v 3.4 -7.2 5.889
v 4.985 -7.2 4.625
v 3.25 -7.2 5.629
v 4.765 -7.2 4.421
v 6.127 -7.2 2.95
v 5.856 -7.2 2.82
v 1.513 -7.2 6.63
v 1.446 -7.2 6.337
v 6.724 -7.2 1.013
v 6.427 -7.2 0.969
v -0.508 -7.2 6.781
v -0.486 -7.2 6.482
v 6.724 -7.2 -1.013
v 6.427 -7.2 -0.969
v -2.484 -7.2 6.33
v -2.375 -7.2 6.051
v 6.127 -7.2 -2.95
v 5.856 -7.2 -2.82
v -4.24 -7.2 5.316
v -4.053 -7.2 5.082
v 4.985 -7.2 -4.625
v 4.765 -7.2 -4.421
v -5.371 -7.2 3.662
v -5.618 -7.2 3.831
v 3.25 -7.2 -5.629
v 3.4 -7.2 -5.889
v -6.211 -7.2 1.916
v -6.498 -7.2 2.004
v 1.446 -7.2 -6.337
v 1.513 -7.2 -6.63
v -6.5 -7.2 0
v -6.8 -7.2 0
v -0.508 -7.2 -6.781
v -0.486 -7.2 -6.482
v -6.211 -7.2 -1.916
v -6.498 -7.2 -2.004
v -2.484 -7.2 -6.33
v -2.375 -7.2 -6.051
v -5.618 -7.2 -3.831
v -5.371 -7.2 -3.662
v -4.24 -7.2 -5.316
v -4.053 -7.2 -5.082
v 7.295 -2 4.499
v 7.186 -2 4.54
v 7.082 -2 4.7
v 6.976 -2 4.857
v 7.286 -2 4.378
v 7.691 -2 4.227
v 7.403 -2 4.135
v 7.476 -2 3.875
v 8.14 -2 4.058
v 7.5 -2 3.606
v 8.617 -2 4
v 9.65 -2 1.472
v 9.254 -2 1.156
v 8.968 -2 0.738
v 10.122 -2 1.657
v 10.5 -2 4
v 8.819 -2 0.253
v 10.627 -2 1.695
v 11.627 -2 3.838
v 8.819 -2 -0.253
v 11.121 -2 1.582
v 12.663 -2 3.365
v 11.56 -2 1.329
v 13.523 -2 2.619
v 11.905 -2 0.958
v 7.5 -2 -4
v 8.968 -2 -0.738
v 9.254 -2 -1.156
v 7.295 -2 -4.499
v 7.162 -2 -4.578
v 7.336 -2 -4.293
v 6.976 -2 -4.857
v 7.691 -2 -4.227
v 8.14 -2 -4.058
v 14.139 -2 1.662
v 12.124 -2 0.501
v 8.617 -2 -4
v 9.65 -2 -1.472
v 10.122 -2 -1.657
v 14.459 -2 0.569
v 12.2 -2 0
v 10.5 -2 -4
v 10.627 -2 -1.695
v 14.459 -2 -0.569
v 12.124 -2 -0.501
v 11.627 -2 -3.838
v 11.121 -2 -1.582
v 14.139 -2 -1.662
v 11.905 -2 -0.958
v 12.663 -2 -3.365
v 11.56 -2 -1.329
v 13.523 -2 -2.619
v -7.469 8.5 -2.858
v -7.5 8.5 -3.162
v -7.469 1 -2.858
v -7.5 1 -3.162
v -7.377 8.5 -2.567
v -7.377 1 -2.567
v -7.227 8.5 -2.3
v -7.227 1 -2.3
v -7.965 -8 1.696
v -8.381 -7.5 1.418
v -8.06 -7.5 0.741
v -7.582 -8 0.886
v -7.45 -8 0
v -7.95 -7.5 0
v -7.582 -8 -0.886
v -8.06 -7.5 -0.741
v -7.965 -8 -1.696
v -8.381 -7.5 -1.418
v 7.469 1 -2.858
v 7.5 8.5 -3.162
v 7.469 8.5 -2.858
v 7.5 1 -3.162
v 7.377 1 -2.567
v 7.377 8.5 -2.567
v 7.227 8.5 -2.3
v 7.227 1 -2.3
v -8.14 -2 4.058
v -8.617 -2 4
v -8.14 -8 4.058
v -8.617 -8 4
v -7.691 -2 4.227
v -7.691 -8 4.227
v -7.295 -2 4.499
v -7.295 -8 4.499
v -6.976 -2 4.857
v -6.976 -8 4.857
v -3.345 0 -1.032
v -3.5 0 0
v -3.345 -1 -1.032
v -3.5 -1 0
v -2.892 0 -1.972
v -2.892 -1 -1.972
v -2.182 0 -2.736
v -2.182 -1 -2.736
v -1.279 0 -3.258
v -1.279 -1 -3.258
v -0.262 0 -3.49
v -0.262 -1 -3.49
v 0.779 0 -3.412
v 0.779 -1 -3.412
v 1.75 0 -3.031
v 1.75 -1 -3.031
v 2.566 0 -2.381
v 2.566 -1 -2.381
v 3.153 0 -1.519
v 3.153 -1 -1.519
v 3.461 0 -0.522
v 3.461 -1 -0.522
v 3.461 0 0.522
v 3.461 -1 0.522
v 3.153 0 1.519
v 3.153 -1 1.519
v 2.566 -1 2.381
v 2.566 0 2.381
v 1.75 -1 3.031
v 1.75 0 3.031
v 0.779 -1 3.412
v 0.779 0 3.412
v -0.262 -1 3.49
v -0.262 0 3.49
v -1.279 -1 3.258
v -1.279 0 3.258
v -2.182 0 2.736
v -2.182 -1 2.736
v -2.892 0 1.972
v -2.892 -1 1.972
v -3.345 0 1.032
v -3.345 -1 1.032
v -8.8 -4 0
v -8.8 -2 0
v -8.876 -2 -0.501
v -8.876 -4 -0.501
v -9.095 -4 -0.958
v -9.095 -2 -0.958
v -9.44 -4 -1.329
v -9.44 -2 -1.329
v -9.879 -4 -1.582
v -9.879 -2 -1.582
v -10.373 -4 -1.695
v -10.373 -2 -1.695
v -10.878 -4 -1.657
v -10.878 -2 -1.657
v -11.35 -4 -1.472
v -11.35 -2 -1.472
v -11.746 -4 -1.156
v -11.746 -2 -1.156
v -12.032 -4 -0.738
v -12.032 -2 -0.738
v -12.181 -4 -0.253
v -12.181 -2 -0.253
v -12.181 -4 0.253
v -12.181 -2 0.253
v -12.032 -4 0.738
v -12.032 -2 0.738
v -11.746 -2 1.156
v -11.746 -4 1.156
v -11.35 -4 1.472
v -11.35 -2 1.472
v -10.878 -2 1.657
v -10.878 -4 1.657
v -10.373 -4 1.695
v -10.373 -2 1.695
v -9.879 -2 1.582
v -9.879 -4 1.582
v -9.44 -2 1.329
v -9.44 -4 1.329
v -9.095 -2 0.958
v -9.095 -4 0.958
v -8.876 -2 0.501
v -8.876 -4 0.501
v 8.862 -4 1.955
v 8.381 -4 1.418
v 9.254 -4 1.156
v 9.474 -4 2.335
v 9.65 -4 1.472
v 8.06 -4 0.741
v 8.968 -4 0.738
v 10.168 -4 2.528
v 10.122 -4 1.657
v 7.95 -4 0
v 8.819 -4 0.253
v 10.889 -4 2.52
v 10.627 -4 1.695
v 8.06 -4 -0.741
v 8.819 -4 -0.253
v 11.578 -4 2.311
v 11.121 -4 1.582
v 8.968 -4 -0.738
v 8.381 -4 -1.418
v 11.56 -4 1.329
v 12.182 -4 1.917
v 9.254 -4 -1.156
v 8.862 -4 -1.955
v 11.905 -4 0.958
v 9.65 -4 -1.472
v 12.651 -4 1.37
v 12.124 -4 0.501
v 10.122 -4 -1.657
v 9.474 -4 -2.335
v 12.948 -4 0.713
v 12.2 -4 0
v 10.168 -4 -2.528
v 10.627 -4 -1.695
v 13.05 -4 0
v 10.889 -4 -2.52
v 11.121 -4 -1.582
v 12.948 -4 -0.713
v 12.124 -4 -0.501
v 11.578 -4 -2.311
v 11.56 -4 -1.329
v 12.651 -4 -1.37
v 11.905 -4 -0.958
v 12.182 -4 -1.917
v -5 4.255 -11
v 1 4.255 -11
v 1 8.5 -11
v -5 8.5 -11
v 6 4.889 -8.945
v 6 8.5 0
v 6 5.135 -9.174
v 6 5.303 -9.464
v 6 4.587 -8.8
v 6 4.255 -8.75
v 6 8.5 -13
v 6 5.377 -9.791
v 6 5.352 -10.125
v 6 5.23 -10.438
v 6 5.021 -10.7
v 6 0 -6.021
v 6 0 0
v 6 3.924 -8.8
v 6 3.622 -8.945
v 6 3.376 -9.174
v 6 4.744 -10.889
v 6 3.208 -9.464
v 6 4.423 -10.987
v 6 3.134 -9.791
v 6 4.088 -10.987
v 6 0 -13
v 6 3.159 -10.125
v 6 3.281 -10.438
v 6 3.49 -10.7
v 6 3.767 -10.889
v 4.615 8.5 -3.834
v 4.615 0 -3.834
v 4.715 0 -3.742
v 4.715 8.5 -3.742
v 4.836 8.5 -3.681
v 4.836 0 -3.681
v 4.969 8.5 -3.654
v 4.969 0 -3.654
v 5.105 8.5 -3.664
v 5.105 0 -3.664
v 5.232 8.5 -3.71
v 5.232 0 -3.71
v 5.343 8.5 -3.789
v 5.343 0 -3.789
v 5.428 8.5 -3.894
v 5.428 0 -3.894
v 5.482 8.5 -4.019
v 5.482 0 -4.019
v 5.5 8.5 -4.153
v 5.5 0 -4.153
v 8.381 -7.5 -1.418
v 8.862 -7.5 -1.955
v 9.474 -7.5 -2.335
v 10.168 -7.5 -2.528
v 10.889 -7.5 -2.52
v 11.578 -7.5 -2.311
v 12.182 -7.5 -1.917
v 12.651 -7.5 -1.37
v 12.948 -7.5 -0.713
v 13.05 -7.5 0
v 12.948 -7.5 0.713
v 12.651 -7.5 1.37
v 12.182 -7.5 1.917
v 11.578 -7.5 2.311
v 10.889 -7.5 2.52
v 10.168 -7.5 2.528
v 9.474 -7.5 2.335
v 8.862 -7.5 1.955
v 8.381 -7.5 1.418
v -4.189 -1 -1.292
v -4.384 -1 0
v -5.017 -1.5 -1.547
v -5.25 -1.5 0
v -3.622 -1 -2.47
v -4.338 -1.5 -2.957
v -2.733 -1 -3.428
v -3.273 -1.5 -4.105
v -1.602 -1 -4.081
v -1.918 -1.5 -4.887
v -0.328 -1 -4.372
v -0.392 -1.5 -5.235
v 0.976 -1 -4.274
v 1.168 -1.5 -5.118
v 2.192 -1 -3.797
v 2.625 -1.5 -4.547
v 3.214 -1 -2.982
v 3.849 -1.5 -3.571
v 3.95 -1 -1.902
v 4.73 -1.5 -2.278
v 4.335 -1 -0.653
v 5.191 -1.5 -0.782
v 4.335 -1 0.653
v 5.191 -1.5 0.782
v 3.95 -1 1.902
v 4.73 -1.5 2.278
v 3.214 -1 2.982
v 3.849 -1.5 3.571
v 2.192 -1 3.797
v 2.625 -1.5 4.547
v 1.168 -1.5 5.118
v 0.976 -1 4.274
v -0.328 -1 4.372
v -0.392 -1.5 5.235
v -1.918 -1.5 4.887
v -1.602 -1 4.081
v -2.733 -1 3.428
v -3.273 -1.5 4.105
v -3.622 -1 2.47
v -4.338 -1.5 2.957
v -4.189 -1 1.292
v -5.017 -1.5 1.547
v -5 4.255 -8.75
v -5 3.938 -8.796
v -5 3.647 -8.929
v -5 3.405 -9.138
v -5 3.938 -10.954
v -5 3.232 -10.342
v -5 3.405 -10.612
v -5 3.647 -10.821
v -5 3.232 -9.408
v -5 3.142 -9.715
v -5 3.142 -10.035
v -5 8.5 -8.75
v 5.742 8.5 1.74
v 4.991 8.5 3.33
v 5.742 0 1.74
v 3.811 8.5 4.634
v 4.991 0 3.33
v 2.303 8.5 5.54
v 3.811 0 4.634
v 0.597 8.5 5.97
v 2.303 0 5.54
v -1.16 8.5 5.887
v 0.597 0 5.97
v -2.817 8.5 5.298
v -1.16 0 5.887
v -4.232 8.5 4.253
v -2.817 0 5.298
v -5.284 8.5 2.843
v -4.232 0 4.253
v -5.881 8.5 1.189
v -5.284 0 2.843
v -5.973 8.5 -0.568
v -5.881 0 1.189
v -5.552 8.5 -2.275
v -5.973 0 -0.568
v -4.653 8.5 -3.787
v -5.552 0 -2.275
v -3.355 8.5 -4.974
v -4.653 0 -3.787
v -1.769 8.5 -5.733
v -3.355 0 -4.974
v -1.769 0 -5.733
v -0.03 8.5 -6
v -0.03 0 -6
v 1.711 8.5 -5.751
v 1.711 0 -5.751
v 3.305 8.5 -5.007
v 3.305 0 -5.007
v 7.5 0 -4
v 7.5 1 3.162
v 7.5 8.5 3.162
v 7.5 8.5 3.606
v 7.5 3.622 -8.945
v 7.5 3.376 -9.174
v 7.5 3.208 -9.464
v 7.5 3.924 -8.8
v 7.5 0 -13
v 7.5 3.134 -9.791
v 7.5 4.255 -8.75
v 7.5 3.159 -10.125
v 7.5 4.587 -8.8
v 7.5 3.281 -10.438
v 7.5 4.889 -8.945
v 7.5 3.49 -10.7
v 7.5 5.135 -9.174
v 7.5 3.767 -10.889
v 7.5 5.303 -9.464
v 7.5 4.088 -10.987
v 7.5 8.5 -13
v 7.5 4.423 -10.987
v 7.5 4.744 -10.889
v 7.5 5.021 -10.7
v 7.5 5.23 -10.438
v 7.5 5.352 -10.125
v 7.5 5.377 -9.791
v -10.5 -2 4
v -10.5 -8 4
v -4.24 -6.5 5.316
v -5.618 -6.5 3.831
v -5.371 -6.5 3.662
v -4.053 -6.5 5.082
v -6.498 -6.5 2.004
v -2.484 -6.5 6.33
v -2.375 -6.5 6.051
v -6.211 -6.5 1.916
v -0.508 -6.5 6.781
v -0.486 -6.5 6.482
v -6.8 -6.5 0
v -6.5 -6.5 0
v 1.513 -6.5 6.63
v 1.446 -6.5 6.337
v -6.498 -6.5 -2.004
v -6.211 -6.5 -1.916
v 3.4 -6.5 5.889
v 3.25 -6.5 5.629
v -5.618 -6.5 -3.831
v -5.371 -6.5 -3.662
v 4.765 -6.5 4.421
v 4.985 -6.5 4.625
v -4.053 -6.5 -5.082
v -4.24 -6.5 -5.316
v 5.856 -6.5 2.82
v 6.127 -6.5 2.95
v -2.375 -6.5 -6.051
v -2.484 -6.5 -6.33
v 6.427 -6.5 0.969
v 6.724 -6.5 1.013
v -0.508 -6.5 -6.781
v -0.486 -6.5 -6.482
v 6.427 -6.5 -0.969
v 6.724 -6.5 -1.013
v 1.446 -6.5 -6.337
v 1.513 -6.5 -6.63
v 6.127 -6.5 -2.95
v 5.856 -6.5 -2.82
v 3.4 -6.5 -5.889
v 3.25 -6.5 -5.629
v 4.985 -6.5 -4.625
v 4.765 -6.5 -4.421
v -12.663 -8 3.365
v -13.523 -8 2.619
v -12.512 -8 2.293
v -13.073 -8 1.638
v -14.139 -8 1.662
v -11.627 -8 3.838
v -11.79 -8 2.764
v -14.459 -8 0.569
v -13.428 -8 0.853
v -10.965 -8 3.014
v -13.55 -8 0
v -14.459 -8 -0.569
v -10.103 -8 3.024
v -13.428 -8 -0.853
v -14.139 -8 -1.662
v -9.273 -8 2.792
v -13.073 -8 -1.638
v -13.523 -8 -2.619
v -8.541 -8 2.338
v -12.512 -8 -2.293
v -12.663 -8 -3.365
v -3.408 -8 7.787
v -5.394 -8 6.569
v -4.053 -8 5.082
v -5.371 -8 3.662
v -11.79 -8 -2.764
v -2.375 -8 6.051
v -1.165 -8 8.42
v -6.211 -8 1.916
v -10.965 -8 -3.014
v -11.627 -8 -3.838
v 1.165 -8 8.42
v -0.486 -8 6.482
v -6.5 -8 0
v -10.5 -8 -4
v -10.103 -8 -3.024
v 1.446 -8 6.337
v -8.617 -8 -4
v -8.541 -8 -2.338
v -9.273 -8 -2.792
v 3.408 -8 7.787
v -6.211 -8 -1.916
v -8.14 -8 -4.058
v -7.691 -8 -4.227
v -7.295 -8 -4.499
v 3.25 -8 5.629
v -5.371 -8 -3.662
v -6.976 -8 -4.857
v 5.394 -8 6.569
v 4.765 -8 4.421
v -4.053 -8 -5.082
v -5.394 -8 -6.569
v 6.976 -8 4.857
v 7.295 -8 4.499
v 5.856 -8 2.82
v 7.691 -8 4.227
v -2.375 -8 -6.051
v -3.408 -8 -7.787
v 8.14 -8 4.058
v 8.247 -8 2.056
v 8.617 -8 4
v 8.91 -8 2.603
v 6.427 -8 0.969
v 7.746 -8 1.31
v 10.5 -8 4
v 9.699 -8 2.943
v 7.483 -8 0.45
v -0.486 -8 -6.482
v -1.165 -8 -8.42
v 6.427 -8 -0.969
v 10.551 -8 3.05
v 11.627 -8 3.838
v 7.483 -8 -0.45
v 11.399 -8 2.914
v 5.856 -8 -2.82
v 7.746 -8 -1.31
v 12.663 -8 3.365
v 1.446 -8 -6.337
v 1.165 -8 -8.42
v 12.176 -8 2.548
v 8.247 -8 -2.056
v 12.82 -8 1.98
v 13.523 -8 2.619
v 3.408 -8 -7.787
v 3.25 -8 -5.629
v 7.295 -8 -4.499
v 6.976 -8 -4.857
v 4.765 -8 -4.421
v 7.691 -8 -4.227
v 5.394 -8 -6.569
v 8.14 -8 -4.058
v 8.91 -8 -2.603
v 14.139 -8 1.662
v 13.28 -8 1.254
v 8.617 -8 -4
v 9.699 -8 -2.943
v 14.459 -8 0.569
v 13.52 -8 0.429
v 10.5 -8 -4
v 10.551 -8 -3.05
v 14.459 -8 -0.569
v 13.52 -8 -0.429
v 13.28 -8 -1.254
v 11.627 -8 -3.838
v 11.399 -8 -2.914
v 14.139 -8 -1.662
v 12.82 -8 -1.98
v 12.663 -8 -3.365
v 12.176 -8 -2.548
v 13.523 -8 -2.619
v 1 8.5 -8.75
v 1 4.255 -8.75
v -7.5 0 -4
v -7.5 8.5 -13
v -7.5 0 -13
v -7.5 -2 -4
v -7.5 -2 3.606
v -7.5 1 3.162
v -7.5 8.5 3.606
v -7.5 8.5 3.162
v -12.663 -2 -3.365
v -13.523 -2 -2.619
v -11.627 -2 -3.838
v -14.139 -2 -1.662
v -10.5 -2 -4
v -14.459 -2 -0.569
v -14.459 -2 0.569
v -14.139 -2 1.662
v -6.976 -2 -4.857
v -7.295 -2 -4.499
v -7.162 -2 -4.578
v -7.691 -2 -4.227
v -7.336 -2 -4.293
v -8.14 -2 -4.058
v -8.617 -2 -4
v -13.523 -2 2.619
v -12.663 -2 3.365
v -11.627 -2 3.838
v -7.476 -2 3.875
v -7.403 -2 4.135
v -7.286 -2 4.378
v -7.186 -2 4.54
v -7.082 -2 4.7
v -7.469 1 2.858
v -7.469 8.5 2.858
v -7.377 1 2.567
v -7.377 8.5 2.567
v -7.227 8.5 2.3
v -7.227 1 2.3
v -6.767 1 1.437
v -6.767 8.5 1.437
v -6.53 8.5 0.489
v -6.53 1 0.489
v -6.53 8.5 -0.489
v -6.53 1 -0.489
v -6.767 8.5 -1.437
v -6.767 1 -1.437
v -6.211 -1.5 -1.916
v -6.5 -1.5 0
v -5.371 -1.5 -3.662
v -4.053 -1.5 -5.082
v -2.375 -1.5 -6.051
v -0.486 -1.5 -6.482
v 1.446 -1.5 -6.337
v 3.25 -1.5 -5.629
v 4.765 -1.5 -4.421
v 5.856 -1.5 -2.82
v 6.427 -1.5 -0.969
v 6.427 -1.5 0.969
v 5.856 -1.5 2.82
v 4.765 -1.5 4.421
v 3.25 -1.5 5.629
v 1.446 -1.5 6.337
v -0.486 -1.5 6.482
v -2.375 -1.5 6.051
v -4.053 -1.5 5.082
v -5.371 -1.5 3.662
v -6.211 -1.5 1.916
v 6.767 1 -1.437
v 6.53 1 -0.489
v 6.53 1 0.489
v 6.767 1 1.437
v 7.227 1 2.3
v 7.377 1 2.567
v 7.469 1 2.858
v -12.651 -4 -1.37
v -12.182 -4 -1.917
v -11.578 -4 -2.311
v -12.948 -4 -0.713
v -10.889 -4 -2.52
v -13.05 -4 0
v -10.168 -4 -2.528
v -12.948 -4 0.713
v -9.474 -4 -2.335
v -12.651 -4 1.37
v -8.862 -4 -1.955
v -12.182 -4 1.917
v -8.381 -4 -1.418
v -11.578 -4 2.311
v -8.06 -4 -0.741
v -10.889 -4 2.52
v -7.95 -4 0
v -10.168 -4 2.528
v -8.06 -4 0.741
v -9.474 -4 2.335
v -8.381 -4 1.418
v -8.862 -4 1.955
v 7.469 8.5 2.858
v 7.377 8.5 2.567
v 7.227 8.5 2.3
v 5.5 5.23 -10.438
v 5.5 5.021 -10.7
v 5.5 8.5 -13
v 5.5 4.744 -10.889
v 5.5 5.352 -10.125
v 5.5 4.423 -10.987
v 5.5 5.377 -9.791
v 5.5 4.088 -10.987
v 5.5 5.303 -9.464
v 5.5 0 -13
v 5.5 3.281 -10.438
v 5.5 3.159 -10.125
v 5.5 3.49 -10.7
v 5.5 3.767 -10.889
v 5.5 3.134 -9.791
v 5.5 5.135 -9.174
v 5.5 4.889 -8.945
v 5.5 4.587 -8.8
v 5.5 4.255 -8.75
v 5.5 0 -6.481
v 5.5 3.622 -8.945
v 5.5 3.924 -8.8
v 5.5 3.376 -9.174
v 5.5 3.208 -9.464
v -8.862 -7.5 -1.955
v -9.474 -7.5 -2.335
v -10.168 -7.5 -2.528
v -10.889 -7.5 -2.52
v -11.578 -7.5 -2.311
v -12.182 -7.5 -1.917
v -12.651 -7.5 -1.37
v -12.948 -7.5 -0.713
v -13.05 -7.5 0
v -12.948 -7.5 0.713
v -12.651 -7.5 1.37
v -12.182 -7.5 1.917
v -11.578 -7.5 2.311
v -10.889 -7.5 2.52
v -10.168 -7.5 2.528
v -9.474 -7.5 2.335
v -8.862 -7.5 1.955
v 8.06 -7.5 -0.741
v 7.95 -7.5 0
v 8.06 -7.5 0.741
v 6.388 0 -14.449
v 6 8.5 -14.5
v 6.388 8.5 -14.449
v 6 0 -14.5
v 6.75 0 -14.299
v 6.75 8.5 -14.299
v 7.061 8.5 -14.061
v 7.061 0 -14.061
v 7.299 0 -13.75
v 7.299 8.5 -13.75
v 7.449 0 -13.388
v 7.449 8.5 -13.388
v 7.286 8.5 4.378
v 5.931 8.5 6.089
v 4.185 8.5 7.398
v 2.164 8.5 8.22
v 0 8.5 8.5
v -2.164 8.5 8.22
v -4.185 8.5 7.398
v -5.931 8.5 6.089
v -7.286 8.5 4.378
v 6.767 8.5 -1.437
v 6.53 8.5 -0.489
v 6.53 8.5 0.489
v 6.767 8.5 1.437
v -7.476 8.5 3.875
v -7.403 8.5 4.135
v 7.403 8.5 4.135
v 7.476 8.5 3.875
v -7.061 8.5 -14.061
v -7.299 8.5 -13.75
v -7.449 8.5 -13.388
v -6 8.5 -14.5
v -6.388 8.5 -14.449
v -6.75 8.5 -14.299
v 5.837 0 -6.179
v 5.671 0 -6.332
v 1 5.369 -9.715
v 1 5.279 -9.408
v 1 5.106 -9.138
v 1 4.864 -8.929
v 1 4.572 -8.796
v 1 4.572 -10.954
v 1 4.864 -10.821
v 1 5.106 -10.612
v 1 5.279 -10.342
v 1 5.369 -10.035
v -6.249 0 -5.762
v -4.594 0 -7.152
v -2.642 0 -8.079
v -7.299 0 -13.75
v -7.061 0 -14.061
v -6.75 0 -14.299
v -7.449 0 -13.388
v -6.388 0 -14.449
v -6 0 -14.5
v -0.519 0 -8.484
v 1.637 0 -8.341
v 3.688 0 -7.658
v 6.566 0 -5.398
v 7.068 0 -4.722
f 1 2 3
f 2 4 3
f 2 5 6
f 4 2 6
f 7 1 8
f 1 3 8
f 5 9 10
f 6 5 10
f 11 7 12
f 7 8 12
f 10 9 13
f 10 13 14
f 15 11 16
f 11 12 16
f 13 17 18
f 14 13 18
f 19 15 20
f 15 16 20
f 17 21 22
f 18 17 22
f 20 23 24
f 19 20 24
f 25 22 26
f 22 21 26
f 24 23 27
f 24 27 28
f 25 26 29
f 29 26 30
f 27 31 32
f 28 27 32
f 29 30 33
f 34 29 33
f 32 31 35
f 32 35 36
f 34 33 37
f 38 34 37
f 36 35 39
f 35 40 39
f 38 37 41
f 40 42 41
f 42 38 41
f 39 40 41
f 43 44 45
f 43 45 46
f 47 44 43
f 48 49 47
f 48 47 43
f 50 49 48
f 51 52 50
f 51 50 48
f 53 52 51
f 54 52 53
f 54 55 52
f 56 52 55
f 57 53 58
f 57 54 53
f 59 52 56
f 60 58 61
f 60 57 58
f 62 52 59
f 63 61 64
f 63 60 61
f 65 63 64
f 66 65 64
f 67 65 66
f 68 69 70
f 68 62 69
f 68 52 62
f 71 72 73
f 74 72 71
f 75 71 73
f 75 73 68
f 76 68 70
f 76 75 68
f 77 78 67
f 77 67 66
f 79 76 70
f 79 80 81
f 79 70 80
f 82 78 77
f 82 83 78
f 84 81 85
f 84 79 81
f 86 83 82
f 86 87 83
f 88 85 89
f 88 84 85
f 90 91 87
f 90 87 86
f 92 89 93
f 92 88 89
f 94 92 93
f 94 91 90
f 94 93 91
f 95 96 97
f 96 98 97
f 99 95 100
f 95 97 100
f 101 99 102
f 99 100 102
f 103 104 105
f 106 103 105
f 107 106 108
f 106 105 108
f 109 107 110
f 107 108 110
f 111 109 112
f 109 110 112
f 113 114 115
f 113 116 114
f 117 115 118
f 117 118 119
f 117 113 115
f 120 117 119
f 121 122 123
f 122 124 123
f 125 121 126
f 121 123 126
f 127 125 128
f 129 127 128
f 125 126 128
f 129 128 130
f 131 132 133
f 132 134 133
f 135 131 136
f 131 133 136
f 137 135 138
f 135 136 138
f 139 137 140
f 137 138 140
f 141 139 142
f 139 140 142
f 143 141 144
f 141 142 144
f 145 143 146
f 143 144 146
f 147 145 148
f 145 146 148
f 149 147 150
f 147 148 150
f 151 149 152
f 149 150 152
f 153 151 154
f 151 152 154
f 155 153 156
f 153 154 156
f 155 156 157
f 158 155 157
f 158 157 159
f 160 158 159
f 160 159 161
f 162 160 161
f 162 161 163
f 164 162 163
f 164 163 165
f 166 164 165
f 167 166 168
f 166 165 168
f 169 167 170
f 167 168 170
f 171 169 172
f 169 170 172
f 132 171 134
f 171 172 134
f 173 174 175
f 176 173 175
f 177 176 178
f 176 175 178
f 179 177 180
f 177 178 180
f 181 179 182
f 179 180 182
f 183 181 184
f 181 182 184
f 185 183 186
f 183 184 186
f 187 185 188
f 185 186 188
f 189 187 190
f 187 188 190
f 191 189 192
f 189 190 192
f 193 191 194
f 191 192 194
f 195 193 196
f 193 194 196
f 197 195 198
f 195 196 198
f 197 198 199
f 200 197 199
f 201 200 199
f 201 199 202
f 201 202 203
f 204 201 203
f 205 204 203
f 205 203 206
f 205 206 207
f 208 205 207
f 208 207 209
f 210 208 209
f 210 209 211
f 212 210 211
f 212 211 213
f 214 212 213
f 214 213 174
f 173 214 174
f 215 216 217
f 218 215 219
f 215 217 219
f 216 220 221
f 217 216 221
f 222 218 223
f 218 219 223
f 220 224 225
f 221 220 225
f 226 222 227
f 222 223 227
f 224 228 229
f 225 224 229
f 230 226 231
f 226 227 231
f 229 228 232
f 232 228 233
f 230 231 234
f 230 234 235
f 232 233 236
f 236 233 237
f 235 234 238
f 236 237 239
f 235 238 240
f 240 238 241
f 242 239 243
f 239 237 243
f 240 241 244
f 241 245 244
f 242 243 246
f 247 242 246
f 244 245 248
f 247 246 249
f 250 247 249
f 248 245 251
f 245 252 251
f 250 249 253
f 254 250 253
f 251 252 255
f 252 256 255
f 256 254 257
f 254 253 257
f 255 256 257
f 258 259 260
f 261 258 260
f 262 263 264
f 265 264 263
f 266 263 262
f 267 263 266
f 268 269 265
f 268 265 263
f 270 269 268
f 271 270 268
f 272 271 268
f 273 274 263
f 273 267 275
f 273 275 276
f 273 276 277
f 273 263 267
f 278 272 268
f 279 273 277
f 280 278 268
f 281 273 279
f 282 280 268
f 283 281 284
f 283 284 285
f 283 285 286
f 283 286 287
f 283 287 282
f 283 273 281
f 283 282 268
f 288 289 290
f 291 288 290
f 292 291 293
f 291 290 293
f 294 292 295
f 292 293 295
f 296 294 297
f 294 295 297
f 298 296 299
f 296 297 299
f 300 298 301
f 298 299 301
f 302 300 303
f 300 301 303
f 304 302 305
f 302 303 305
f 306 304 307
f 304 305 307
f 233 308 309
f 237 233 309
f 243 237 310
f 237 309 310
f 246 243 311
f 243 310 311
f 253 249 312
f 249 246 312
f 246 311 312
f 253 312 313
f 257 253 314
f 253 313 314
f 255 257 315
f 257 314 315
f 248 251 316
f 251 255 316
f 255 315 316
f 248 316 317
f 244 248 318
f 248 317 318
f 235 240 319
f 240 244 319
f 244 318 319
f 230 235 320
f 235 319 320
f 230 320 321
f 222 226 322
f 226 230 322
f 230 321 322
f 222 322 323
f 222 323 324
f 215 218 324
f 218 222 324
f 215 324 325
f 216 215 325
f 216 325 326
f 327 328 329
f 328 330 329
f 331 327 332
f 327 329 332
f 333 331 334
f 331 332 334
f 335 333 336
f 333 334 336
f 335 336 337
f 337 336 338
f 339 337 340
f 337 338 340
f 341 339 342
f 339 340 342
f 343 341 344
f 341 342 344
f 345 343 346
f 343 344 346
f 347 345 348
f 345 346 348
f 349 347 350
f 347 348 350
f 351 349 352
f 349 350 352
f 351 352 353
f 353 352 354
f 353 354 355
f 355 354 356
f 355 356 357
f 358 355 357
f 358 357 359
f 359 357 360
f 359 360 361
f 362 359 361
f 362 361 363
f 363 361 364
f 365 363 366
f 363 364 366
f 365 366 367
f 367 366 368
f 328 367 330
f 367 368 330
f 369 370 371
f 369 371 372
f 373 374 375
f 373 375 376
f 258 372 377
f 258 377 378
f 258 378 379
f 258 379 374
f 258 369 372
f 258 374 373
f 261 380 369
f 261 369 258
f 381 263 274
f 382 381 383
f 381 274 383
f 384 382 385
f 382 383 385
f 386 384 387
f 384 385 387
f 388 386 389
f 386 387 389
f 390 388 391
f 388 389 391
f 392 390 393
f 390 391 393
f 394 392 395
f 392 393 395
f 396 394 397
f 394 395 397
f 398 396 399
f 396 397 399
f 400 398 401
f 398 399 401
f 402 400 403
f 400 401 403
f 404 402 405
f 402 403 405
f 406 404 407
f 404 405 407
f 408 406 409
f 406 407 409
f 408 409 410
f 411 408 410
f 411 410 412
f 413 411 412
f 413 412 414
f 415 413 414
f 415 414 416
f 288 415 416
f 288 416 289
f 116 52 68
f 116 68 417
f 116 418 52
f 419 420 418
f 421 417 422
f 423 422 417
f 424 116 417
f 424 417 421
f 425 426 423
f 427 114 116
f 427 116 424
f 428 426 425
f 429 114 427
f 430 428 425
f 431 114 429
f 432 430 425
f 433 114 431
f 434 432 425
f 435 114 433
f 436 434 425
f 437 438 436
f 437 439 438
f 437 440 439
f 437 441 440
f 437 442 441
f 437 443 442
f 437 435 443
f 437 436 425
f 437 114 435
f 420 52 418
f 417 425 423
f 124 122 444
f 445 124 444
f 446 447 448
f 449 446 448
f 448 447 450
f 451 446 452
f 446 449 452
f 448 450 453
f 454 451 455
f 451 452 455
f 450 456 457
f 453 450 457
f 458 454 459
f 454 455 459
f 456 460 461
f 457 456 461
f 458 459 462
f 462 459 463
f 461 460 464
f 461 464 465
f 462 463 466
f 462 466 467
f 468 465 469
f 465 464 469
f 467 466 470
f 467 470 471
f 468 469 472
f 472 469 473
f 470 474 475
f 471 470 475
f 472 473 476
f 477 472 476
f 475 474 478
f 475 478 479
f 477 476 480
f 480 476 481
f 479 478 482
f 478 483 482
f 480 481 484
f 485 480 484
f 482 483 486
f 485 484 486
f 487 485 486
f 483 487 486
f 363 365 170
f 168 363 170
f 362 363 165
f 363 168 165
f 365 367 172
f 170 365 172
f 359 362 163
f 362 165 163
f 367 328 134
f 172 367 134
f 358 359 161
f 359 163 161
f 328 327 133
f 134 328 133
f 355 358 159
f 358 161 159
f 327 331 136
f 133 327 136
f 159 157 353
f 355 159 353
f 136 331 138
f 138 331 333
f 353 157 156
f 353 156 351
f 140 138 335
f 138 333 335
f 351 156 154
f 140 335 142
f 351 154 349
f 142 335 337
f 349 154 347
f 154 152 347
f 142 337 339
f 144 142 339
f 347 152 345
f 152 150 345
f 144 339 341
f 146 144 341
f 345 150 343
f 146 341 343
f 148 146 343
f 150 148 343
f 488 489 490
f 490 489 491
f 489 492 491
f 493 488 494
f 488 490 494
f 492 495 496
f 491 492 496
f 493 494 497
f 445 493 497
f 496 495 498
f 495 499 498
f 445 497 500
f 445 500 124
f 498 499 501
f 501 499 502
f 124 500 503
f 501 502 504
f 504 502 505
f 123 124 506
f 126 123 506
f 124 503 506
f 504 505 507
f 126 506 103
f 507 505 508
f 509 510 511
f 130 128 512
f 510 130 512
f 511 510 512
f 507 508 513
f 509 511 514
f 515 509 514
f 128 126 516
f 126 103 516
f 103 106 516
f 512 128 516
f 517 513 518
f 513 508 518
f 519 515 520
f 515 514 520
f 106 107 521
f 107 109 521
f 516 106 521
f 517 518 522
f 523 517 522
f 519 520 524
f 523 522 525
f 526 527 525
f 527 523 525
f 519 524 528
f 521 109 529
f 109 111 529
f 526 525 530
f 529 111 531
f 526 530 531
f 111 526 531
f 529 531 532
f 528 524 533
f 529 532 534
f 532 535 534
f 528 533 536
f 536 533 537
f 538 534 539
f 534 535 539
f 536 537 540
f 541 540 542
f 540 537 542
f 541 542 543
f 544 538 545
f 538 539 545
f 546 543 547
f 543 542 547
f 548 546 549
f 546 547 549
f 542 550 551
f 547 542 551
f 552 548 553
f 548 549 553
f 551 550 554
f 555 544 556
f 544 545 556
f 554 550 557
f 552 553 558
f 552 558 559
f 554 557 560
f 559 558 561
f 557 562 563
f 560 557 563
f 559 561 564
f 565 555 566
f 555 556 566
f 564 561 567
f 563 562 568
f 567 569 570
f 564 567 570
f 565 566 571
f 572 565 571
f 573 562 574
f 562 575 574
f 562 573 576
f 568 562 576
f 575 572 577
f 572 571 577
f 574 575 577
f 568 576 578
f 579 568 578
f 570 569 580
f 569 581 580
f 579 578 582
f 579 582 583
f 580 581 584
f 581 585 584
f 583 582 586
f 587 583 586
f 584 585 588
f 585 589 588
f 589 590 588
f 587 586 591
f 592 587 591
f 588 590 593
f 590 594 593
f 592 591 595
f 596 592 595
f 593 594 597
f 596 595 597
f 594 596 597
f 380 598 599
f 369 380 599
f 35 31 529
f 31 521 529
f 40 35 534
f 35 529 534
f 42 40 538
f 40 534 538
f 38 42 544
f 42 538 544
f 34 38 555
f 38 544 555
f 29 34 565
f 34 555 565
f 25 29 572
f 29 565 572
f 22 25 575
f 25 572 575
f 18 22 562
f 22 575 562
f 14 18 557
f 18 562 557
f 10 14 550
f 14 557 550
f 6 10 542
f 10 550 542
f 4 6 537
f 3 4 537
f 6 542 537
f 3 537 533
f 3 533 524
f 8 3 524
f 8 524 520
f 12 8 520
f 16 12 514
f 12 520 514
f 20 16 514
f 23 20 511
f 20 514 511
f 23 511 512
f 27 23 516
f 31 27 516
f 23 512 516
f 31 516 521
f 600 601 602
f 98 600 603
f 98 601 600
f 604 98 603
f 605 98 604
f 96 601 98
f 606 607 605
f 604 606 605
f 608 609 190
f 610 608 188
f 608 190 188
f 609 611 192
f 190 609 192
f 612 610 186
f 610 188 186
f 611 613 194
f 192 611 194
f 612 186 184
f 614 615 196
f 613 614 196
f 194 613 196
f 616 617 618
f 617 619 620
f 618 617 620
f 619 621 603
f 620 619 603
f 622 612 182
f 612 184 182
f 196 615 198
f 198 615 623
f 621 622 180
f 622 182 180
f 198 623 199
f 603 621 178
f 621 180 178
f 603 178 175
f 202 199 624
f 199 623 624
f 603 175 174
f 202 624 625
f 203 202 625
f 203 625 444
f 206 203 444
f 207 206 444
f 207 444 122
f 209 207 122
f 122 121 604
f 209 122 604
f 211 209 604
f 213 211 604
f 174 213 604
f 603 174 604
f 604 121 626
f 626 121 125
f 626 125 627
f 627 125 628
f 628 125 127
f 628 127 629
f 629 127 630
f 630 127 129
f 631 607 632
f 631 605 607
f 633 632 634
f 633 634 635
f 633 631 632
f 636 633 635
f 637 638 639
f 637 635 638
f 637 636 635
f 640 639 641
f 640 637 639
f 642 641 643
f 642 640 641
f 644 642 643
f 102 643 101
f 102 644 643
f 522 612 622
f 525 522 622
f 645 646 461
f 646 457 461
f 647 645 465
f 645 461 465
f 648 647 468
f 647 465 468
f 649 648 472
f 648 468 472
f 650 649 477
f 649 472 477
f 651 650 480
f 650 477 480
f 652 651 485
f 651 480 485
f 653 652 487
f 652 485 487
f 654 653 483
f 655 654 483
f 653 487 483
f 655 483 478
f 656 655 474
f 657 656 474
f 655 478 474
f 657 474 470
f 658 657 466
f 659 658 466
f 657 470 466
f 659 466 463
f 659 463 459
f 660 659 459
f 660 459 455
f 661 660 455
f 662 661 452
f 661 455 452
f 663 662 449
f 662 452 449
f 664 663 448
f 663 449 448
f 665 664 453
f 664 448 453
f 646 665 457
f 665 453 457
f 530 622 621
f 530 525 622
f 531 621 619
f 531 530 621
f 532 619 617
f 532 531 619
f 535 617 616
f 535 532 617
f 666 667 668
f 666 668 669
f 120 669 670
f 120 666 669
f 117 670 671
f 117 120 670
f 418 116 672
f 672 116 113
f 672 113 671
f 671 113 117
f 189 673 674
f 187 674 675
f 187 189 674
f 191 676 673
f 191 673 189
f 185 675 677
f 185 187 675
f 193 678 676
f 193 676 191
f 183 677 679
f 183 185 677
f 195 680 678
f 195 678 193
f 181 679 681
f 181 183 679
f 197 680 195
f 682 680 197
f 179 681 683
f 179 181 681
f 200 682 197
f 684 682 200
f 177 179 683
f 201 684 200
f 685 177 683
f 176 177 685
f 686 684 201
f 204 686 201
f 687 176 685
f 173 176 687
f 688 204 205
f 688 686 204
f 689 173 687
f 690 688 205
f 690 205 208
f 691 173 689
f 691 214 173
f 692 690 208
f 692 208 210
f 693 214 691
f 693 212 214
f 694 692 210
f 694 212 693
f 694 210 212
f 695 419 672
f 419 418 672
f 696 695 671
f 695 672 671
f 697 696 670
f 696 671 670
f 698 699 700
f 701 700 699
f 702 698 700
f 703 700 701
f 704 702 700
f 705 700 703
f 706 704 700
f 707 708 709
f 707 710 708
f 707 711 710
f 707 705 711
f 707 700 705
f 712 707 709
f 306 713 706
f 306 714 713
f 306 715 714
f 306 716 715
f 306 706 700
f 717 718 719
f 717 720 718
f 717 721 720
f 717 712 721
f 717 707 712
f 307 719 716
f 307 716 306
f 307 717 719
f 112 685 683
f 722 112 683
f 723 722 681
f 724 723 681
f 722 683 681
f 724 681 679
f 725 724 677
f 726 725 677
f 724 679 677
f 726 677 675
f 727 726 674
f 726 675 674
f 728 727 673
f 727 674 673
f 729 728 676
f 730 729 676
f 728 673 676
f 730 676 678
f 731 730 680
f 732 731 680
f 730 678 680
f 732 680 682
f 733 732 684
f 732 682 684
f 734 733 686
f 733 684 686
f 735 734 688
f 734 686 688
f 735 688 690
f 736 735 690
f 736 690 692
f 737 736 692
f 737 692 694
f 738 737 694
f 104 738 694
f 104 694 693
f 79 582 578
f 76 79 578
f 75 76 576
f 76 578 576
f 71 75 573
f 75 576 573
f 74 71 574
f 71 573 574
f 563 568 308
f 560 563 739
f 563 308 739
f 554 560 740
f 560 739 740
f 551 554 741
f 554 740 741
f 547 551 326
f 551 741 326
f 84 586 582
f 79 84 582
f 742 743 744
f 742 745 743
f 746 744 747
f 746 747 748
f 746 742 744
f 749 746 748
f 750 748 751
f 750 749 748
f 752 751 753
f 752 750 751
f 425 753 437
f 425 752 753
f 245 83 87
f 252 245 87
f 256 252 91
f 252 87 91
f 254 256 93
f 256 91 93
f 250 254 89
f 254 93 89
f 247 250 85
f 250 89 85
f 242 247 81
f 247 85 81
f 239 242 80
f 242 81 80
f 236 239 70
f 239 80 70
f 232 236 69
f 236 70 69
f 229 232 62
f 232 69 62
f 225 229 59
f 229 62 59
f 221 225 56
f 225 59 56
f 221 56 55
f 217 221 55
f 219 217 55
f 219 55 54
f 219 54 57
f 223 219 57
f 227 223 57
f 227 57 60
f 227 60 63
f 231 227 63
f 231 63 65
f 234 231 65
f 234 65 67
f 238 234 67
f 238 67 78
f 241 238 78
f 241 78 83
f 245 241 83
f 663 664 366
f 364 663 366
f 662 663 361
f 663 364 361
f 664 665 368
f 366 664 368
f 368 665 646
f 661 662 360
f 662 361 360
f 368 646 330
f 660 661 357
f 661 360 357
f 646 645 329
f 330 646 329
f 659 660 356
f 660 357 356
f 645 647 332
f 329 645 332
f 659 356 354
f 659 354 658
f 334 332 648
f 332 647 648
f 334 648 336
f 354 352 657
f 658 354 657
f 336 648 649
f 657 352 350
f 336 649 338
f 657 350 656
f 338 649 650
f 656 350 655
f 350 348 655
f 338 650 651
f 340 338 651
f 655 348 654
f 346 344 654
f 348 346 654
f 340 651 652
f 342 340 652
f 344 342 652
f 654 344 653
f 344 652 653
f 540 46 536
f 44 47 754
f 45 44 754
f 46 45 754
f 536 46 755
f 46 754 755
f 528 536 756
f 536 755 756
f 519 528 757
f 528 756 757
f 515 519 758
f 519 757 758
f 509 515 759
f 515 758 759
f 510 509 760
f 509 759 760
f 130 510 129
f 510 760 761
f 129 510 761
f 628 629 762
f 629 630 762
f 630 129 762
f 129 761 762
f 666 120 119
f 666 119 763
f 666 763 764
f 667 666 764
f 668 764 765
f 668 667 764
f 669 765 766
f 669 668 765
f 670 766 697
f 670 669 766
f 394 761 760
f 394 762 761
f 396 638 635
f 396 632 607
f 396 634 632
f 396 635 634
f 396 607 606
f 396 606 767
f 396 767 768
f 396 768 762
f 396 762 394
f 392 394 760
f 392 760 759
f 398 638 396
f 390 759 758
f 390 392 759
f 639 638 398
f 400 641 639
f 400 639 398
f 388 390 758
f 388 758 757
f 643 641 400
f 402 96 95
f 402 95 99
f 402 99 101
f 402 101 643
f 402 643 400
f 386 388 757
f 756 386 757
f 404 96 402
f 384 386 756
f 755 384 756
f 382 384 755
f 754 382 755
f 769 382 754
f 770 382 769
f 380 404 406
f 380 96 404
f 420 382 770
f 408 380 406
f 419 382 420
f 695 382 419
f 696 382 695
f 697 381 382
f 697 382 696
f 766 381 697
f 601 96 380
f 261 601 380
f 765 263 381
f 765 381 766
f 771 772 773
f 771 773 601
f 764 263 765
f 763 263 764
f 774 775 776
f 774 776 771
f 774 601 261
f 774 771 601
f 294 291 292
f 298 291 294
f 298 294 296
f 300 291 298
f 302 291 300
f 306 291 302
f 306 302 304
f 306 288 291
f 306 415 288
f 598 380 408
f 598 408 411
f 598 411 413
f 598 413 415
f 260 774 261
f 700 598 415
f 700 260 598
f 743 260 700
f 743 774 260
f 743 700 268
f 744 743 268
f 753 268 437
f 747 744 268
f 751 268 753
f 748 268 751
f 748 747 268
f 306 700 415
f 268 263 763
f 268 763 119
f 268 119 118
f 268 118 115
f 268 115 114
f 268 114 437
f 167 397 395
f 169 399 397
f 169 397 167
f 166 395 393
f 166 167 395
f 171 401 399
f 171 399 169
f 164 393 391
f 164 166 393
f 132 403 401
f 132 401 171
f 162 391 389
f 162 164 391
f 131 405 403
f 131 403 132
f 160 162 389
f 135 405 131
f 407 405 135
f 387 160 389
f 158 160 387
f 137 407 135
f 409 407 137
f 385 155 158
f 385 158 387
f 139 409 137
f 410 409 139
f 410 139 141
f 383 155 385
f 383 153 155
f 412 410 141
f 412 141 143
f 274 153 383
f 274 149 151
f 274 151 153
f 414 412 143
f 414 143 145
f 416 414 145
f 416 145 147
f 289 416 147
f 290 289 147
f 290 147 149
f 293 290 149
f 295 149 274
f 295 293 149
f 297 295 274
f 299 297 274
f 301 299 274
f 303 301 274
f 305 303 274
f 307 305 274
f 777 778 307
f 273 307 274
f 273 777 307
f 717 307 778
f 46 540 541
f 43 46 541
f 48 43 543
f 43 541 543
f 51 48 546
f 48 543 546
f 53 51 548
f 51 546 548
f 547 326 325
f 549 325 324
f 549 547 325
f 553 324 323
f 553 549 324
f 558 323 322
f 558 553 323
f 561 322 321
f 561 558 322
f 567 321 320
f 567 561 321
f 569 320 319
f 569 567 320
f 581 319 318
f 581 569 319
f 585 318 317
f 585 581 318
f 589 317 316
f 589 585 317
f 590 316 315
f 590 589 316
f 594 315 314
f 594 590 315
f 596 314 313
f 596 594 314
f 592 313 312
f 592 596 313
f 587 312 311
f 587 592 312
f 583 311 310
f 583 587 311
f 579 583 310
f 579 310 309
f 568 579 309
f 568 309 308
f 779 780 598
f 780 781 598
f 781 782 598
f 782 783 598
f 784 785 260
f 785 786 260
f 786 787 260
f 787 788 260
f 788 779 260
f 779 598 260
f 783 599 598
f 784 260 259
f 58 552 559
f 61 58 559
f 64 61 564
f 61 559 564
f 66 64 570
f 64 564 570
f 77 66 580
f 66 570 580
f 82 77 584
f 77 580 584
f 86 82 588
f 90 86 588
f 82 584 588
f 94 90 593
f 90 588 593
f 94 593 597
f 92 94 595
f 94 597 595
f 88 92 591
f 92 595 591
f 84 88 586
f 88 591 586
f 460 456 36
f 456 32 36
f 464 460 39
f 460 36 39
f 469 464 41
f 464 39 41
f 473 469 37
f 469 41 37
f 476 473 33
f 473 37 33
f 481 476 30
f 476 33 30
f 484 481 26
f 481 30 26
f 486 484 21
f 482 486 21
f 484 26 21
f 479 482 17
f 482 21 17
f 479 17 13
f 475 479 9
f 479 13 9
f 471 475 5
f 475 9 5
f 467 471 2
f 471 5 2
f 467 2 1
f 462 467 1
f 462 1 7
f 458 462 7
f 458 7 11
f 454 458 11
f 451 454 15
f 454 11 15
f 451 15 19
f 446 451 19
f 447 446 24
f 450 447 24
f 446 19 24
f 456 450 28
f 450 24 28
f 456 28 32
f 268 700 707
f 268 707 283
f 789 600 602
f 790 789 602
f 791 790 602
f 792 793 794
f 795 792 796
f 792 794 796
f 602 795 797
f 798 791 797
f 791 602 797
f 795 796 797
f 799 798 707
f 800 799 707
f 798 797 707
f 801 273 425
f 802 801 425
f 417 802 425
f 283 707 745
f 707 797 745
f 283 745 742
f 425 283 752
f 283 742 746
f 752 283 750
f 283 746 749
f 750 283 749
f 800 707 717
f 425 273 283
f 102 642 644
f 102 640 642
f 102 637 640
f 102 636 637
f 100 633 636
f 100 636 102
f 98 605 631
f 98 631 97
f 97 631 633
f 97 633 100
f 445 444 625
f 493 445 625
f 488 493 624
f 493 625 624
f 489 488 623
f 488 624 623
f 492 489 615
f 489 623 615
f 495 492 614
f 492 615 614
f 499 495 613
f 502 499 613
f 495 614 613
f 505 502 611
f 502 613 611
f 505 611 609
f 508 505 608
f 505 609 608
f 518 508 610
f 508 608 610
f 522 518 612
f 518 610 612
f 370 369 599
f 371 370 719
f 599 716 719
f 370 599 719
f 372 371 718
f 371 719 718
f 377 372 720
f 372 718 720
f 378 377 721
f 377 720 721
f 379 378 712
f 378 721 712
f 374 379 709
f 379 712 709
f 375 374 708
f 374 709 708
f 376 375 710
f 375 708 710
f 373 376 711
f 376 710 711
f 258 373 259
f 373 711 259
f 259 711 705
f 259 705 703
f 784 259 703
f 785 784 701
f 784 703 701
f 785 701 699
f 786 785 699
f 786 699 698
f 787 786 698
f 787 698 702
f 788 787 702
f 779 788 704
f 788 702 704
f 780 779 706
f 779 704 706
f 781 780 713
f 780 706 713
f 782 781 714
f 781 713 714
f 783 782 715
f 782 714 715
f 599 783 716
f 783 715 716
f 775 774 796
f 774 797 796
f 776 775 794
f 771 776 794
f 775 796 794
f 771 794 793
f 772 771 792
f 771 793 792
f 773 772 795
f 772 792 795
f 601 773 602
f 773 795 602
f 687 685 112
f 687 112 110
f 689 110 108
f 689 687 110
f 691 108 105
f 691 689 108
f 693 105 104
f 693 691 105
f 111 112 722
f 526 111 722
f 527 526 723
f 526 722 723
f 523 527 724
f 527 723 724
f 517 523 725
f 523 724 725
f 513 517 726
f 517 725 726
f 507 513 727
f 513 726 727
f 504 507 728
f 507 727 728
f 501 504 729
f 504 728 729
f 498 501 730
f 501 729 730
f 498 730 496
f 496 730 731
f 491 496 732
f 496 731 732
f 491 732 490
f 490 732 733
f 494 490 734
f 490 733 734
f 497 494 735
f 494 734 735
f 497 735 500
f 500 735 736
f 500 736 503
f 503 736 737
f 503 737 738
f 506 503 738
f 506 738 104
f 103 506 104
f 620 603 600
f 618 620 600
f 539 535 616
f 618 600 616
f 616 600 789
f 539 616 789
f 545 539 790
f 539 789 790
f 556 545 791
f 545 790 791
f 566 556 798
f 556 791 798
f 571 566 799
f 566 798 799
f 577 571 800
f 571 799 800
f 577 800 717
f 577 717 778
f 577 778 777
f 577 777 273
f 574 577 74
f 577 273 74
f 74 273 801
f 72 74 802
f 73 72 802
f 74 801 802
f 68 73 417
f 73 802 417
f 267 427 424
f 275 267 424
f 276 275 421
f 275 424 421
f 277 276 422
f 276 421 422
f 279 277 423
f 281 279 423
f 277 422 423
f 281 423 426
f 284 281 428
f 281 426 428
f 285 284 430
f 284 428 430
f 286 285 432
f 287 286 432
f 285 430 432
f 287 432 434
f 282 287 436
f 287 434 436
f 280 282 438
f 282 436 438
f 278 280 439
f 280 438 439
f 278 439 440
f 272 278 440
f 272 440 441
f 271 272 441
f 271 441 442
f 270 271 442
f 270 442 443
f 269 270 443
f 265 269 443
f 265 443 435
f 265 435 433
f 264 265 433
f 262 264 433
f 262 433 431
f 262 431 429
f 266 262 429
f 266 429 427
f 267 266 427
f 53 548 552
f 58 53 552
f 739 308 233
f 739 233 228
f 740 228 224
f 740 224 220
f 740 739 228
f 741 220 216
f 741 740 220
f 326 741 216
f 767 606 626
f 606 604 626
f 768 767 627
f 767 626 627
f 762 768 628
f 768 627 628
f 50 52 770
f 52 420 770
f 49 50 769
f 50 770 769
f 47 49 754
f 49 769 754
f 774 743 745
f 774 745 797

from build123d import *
from build123d.topology import SkipClean

# Parameters (mm, degrees)
BOSS_EXTRU_1_START      = -6
BOSS_EXTRU_1_DEPTH      = 6
BOSS_EXTRU_2_START      = -6
BOSS_EXTRU_2_DEPTH      = 2
ENL_V_START             = -4
ESQUISSE3_5_R           = 2.55
ENL_V_MAT_EXTRU_1_DEPTH = 4
ENL_V_START_2           = -16.5
ENL_V_MAT_EXTRU_5_DEPTH = 10.5
CONG_1_R                = 2
CHANFREIN1_SIZE         = 0.5
SYM_TRIE1_START         = -2
SYM_TRIE1_DEPTH         = 10.5
SYM_TRIE1_START_2       = -8
SYM_TRIE1_2_DEPTH       = 4
SYM_TRIE1_START_3       = -7.5000001
SYM_TRIE1_3_DEPTH       = 5.5000001
SYM_TRIE1_START_4       = -4
SYM_TRIE1_4_DEPTH       = 2
SYM_TRIE1_7_DEPTH       = 0.4999999
M3_CLEARANCE_HOLE1_D    = 3.4
BOSS_EXTRU_3_DEPTH      = 8.5
ENL_V_START_3           = -8.5
ENL_V_MAT_EXTRU_2_DEPTH = 8.5
ENL_V_START_4           = -6.5
ESQUISSE5_R             = 1.125
ENL_V_MAT_EXTRU_3_DEPTH = 6
ESQUISSE5_3_R           = 1.125
ENL_V_MAT_EXTRU_4_DEPTH = 6.5
CONG_2_R                = 0.5
CONG_3_R                = 1.5
ENL_V_START_5           = -7.5
ESQUISSE9_R             = 4
ENL_V_MAT_EXTRU_8_DEPTH = 7.5
CONG_5_R                = 1.5


with BuildPart() as part:
    # Esquisse1 → Révolution1 (revolve)
    with BuildSketch(Plane.XY):
        Polygon((-8.5, 8.5), (-6, 8.5), (-6, 0), (-3.5, 0), (-3.5, -1), (-4.383974596, -1), (-5.25, -1.5), (-6.5, -1.5), (-6.5, -6.5), (-6.8, -6.5), (-6.8, -7.2), (-6.5, -7.2), (-6.5, -8), (-8.5, -8), align=None)
    revolve(axis=Axis((0, 6.43509573, 0), (0, -1, 0)))

    # Esquisse3 → Boss.-Extru.1 (add)
    with BuildSketch(Plane.XZ.offset(8).offset(BOSS_EXTRU_1_START)):
        with BuildLine():
            ThreePointArc((-7.928571429, 3.06394437), (-7.728470361, 3.5384666), (-7.5, 4))
            Line((-7.5, 4), (-10.5, 4))
            ThreePointArc((-10.5, 4), (-14.5, 0), (-10.5, -4))
            Line((-10.5, -4), (-7.5, -4))
            ThreePointArc((-7.5, -4), (-7.728470361, -3.5384666), (-7.928571429, -3.06394437))
            ThreePointArc((-7.928571429, -3.06394437), (-8.196108254, -2.252511816), (-8.380833333, -1.418320358))
            ThreePointArc((-8.380833333, -1.418320358), (-13.05, 0), (-8.380833333, 1.418320358))
            ThreePointArc((-8.380833333, 1.418320358), (-8.196108254, 2.252511816), (-7.928571429, 3.06394437))
        make_face()
    extrude(amount=BOSS_EXTRU_1_DEPTH)

    # Esquisse3<4> → Boss.-Extru.2 (add)
    with BuildSketch(Plane.XZ.offset(8).offset(BOSS_EXTRU_2_START)):
        with BuildLine():
            ThreePointArc((-8.380833333, -1.418320358), (-8.5, 0), (-8.380833333, 1.418320358))
            ThreePointArc((-8.380833333, 1.418320358), (-13.05, 0), (-8.380833333, -1.418320358))
        make_face()
    extrude(amount=BOSS_EXTRU_2_DEPTH)

    # Esquisse3<5> → Enlèv. mat.-Extru.1 (cut)
    with BuildSketch(Plane.XZ.offset(8).offset(ENL_V_START)):
        with Locations((-10.5, 0)):
            Circle(ESQUISSE3_5_R)
    extrude(amount=ENL_V_MAT_EXTRU_1_DEPTH, mode=Mode.SUBTRACT)

    # Esquisse3<7> → Enlèv. mat.-Extru.5 (cut)
    with BuildSketch(Plane.XZ.offset(8).offset(ENL_V_START_2)):
        with BuildLine():
            ThreePointArc((-7.5, 4), (-8.5, 0), (-7.5, -4))
            Line((-7.5, -4), (-7.5, 4))
        make_face()
    extrude(amount=ENL_V_MAT_EXTRU_5_DEPTH, mode=Mode.SUBTRACT)

    # Congé1
    cong_1_edges = [part.edges().sort_by_distance(p)[0] for p in [
        (-7.5, -5, 4),
        (-7.5, -5, -4),
    ]]
    fillet(cong_1_edges, radius=CONG_1_R)

    # Chanfrein1
    chanfrein1_edges = [part.edges().sort_by_distance(p)[0] for p in [
        (-8.06008453, -8, 0.741156191),
    ]]
    chamfer(chanfrein1_edges, length=CHANFREIN1_SIZE)

    # Symétrie1: read off the stored shape, not the designer's step
    # Symétrie1 outline → Symétrie1 (cut)
    with BuildSketch(Plane(origin=(0, 0, 0), x_dir=(1, 0, 0), z_dir=(0, 1, 0)).offset(SYM_TRIE1_START)):
        with BuildLine():
            Line((7.5, 4), (7.5, -4))
            ThreePointArc((7.5, -4), (8.5, 0), (7.5, 4))
        make_face()
    extrude(amount=SYM_TRIE1_DEPTH, mode=Mode.SUBTRACT)

    # Sym_trie1 2 outline → Sym_trie1 2 (cut)
    with BuildSketch(Plane(origin=(0, 0, 0), x_dir=(1, 0, 0), z_dir=(0, 1, 0)).offset(SYM_TRIE1_START_2)):
        with BuildLine():
            ThreePointArc((8.380833333, 1.418320358), (7.95, 0), (8.380833333, -1.418320358))
            ThreePointArc((8.380833333, -1.418320358), (8.5, 0), (8.380833333, 1.418320358))
        make_face()
    extrude(amount=SYM_TRIE1_2_DEPTH, mode=Mode.SUBTRACT)

    # Sym_trie1 3 outline → Sym_trie1 3 (add)
    with BuildSketch(Plane(origin=(0, 0, 0), x_dir=(1, 0, 0), z_dir=(0, 1, 0)).offset(SYM_TRIE1_START_3)):
        with BuildLine():
            ThreePointArc((6.975540357, -4.857142857), (7.69102387, -4.227189479), (8.61684397, -4))
            Line((8.61684397, -4), (10.5, -4))
            ThreePointArc((10.5, -4), (14.5, 0), (10.5, 4))
            Line((10.5, 4), (8.61684397, 4))
            ThreePointArc((8.61684397, 4), (7.69102387, 4.227189479), (6.975540357, 4.857142857))
            ThreePointArc((6.975540357, 4.857142857), (7.868349781, 3.215442696), (8.380833333, 1.418320358))
            ThreePointArc((8.380833333, 1.418320358), (13.05, 0), (8.380833333, -1.418320358))
            ThreePointArc((8.380833333, -1.418320358), (7.868349781, -3.215442696), (6.975540357, -4.857142857))
        make_face()
    extrude(amount=SYM_TRIE1_3_DEPTH)

    # Sym_trie1 4 outline → Sym_trie1 4 (add)
    with BuildSketch(Plane(origin=(0, 0, 0), x_dir=(1, 0, 0), z_dir=(0, 1, 0)).offset(SYM_TRIE1_START_4)):
        with BuildLine():
            ThreePointArc((8.380833333, 1.418320358), (8.5, 0), (8.380833333, -1.418320358))
            ThreePointArc((8.380833333, -1.418320358), (13.05, 0), (8.380833333, 1.418320358))
        make_face()
    extrude(amount=SYM_TRIE1_4_DEPTH)

    # Sym_trie1 5 outline → Sym_trie1 5 (revolve, cut)
    with BuildSketch(Plane(origin=(10.5, 0, 0), x_dir=(1, 0, 0), z_dir=(0, 0, 1))):
        Polygon((3.05, -8), (2.55, -7.5), (2.55, -8), align=None)
    revolve(axis=Axis((10.5, 0, 0), (0, 1, 0)), mode=Mode.SUBTRACT)

    # Sym_trie1 6 outline → Sym_trie1 6 (revolve)
    with SkipClean():  # the faces are left unmerged after this step: merging them gives an invalid solid
        with BuildSketch(Plane(origin=(10.5, 0, 0), x_dir=(1, 0, 0), z_dir=(0, 0, 1))):
            Polygon((3.05, -7.5), (2.55, -7.5), (3.05, -8), align=None)
        revolve(axis=Axis((10.5, 0, 0), (0, 1, 0)))

    # Sym_trie1 7 outline → Sym_trie1 7 (add)
    with BuildSketch(Plane(origin=(0, 0, 0), x_dir=(1, 0, 0), z_dir=(0, 1, 0)).offset(SYM_TRIE1_START_2)):
        with BuildLine():
            ThreePointArc((8.2475, 2.056390953), (13.55, 0), (8.2475, -2.056390953))
            ThreePointArc((8.2475, -2.056390953), (7.933495012, -3.051173035), (7.5, -4))
            ThreePointArc((7.5, -4), (7.250447615, -4.436328367), (6.975540357, -4.857142857))
            ThreePointArc((6.975540357, -4.857142857), (7.69102387, -4.227189479), (8.61684397, -4))
            Line((8.61684397, -4), (10.5, -4))
            ThreePointArc((10.5, -4), (14.5, 0), (10.5, 4))
            Line((10.5, 4), (8.61684397, 4))
            ThreePointArc((8.61684397, 4), (7.69102387, 4.227189479), (6.975540357, 4.857142857))
            ThreePointArc((6.975540357, 4.857142857), (7.250447615, 4.436328367), (7.5, 4))
            ThreePointArc((7.5, 4), (7.933495012, 3.051173035), (8.2475, 2.056390953))
        make_face()
    extrude(amount=SYM_TRIE1_7_DEPTH)

    # M3 Clearance Hole1 (through all)
    with Locations(Plane(origin=(0, -4, 0), x_dir=(-1, 0, 0), z_dir=(0, -1, 0))):
        with Locations((10.5, 0), (-10.5, 0)):
            Hole(M3_CLEARANCE_HOLE1_D / 2)

    # Esquisse4 → Boss.-Extru.3 (add)
    with BuildSketch(Plane(origin=(0, 8.5, 0), x_dir=(1, 0, 0), z_dir=(0, 1, 0))):
        with BuildLine():
            Line((7.5, 14.5), (-7.5, 14.5))
            Line((-7.5, 14.5), (-7.5, 4))
            ThreePointArc((-7.5, 4), (-1.593272922, 8.349340177), (5.5, 6.480740698))
            Line((5.5, 6.480740698), (5.5, 13))
            Line((5.5, 13), (6, 13))
            Line((6, 13), (6, 6.020797289))
            ThreePointArc((6, 6.020797289), (6.825203691, 5.066220937), (7.5, 4))
            Line((7.5, 4), (7.5, 14.5))
        make_face()
    extrude(amount=-BOSS_EXTRU_3_DEPTH)

    # Esquisse4<3> → Enlèv. mat.-Extru.2 (cut)
    with BuildSketch(Plane(origin=(0, 8.5, 0), x_dir=(1, 0, 0), z_dir=(0, 1, 0)).offset(ENL_V_START_3)):
        with BuildLine():
            Line((6, 0), (6, 13))
            Line((6, 13), (5.5, 13))
            Line((5.5, 13), (5.5, 2.397915762))
            ThreePointArc((5.5, 2.397915762), (5.873670062, 1.224744871), (6, 0))
        make_face()
    extrude(amount=ENL_V_MAT_EXTRU_2_DEPTH, mode=Mode.SUBTRACT)

    # Esquisse5 → Enlèv. mat.-Extru.3 (cut)
    with BuildSketch(Plane(origin=(7.5, 0, 0), x_dir=(0, 0, -1), z_dir=(1, 0, 0)).offset(ENL_V_START_4)):
        with Locations((9.875, 4.2554)):
            Circle(ESQUISSE5_R)
        with BuildLine():
            Line((8.75, 8.5), (8.75, 4.2554))
            ThreePointArc((8.75, 4.2554), (9.875, 5.3804), (11, 4.2554))
            Line((11, 4.2554), (11, 8.5))
            Line((11, 8.5), (8.75, 8.5))
        make_face()
    extrude(amount=-ENL_V_MAT_EXTRU_3_DEPTH, mode=Mode.SUBTRACT)

    # Esquisse5<3> → Enlèv. mat.-Extru.4 (cut)
    with BuildSketch(Plane(origin=(7.5, 0, 0), x_dir=(0, 0, -1), z_dir=(1, 0, 0))):
        with Locations(Location((9.875, 4.2554, 0), (0, 0, 180))):
            Circle(ESQUISSE5_3_R)
    extrude(amount=-ENL_V_MAT_EXTRU_4_DEPTH, mode=Mode.SUBTRACT)

    # Congé2
    # the kernel refuses this fillet: 0.5 mm, written as the material it takes off along each edge
    with BuildSketch(Plane(origin=(5.5, 0, -2.397915762), x_dir=(0, 0, -1), z_dir=(0, 1, 0))) as cong_2_piece_1:
        with BuildLine():
            CenterArc((1.75539617, 0.5), CONG_2_R, 129.715137232, 140.284862768)
            ThreePointArc((1.435910637, 0.884615385), (0.749192225, 0.391603841), (0, 0))
            Line((0, 0), (1.75539617, 0))
        make_face()
    extrude(amount=12.888490425, mode=Mode.SUBTRACT)

    # Congé3
    cong_3_edges = [part.edges().sort_by_distance(p)[0] for p in [
        (7.5, 3.25, 4),
        (7.5, 4.25, -14.5),
        (-7.5, 4.25, -14.5),
        (-7.5, 3.25, 4),
    ]]
    fillet(cong_3_edges, radius=CONG_3_R)

    # Esquisse9 → Enlèv. mat.-Extru.8 (cut)
    with BuildSketch(Plane(origin=(0, 8.5, 0), x_dir=(1, 0, 0), z_dir=(0, 1, 0)).offset(ENL_V_START_5)):
        with Locations((-10.5, 0)):
            Circle(ESQUISSE9_R)
        with Locations((10.5, 0)):
            Circle(ESQUISSE9_R)
    extrude(amount=ENL_V_MAT_EXTRU_8_DEPTH, mode=Mode.SUBTRACT)

    # Congé5
    cong_5_edges = [part.edges().sort_by_distance(p)[0] for p in [
        (7.5, 4.75, -2.645751311),
        (7.5, 4.75, 2.645751311),
        (-7.5, 4.75, -2.645751311),
        (-7.5, 4.75, 2.645751311),
    ]]
    fillet(cong_5_edges, radius=CONG_5_R)


solid = part.part
